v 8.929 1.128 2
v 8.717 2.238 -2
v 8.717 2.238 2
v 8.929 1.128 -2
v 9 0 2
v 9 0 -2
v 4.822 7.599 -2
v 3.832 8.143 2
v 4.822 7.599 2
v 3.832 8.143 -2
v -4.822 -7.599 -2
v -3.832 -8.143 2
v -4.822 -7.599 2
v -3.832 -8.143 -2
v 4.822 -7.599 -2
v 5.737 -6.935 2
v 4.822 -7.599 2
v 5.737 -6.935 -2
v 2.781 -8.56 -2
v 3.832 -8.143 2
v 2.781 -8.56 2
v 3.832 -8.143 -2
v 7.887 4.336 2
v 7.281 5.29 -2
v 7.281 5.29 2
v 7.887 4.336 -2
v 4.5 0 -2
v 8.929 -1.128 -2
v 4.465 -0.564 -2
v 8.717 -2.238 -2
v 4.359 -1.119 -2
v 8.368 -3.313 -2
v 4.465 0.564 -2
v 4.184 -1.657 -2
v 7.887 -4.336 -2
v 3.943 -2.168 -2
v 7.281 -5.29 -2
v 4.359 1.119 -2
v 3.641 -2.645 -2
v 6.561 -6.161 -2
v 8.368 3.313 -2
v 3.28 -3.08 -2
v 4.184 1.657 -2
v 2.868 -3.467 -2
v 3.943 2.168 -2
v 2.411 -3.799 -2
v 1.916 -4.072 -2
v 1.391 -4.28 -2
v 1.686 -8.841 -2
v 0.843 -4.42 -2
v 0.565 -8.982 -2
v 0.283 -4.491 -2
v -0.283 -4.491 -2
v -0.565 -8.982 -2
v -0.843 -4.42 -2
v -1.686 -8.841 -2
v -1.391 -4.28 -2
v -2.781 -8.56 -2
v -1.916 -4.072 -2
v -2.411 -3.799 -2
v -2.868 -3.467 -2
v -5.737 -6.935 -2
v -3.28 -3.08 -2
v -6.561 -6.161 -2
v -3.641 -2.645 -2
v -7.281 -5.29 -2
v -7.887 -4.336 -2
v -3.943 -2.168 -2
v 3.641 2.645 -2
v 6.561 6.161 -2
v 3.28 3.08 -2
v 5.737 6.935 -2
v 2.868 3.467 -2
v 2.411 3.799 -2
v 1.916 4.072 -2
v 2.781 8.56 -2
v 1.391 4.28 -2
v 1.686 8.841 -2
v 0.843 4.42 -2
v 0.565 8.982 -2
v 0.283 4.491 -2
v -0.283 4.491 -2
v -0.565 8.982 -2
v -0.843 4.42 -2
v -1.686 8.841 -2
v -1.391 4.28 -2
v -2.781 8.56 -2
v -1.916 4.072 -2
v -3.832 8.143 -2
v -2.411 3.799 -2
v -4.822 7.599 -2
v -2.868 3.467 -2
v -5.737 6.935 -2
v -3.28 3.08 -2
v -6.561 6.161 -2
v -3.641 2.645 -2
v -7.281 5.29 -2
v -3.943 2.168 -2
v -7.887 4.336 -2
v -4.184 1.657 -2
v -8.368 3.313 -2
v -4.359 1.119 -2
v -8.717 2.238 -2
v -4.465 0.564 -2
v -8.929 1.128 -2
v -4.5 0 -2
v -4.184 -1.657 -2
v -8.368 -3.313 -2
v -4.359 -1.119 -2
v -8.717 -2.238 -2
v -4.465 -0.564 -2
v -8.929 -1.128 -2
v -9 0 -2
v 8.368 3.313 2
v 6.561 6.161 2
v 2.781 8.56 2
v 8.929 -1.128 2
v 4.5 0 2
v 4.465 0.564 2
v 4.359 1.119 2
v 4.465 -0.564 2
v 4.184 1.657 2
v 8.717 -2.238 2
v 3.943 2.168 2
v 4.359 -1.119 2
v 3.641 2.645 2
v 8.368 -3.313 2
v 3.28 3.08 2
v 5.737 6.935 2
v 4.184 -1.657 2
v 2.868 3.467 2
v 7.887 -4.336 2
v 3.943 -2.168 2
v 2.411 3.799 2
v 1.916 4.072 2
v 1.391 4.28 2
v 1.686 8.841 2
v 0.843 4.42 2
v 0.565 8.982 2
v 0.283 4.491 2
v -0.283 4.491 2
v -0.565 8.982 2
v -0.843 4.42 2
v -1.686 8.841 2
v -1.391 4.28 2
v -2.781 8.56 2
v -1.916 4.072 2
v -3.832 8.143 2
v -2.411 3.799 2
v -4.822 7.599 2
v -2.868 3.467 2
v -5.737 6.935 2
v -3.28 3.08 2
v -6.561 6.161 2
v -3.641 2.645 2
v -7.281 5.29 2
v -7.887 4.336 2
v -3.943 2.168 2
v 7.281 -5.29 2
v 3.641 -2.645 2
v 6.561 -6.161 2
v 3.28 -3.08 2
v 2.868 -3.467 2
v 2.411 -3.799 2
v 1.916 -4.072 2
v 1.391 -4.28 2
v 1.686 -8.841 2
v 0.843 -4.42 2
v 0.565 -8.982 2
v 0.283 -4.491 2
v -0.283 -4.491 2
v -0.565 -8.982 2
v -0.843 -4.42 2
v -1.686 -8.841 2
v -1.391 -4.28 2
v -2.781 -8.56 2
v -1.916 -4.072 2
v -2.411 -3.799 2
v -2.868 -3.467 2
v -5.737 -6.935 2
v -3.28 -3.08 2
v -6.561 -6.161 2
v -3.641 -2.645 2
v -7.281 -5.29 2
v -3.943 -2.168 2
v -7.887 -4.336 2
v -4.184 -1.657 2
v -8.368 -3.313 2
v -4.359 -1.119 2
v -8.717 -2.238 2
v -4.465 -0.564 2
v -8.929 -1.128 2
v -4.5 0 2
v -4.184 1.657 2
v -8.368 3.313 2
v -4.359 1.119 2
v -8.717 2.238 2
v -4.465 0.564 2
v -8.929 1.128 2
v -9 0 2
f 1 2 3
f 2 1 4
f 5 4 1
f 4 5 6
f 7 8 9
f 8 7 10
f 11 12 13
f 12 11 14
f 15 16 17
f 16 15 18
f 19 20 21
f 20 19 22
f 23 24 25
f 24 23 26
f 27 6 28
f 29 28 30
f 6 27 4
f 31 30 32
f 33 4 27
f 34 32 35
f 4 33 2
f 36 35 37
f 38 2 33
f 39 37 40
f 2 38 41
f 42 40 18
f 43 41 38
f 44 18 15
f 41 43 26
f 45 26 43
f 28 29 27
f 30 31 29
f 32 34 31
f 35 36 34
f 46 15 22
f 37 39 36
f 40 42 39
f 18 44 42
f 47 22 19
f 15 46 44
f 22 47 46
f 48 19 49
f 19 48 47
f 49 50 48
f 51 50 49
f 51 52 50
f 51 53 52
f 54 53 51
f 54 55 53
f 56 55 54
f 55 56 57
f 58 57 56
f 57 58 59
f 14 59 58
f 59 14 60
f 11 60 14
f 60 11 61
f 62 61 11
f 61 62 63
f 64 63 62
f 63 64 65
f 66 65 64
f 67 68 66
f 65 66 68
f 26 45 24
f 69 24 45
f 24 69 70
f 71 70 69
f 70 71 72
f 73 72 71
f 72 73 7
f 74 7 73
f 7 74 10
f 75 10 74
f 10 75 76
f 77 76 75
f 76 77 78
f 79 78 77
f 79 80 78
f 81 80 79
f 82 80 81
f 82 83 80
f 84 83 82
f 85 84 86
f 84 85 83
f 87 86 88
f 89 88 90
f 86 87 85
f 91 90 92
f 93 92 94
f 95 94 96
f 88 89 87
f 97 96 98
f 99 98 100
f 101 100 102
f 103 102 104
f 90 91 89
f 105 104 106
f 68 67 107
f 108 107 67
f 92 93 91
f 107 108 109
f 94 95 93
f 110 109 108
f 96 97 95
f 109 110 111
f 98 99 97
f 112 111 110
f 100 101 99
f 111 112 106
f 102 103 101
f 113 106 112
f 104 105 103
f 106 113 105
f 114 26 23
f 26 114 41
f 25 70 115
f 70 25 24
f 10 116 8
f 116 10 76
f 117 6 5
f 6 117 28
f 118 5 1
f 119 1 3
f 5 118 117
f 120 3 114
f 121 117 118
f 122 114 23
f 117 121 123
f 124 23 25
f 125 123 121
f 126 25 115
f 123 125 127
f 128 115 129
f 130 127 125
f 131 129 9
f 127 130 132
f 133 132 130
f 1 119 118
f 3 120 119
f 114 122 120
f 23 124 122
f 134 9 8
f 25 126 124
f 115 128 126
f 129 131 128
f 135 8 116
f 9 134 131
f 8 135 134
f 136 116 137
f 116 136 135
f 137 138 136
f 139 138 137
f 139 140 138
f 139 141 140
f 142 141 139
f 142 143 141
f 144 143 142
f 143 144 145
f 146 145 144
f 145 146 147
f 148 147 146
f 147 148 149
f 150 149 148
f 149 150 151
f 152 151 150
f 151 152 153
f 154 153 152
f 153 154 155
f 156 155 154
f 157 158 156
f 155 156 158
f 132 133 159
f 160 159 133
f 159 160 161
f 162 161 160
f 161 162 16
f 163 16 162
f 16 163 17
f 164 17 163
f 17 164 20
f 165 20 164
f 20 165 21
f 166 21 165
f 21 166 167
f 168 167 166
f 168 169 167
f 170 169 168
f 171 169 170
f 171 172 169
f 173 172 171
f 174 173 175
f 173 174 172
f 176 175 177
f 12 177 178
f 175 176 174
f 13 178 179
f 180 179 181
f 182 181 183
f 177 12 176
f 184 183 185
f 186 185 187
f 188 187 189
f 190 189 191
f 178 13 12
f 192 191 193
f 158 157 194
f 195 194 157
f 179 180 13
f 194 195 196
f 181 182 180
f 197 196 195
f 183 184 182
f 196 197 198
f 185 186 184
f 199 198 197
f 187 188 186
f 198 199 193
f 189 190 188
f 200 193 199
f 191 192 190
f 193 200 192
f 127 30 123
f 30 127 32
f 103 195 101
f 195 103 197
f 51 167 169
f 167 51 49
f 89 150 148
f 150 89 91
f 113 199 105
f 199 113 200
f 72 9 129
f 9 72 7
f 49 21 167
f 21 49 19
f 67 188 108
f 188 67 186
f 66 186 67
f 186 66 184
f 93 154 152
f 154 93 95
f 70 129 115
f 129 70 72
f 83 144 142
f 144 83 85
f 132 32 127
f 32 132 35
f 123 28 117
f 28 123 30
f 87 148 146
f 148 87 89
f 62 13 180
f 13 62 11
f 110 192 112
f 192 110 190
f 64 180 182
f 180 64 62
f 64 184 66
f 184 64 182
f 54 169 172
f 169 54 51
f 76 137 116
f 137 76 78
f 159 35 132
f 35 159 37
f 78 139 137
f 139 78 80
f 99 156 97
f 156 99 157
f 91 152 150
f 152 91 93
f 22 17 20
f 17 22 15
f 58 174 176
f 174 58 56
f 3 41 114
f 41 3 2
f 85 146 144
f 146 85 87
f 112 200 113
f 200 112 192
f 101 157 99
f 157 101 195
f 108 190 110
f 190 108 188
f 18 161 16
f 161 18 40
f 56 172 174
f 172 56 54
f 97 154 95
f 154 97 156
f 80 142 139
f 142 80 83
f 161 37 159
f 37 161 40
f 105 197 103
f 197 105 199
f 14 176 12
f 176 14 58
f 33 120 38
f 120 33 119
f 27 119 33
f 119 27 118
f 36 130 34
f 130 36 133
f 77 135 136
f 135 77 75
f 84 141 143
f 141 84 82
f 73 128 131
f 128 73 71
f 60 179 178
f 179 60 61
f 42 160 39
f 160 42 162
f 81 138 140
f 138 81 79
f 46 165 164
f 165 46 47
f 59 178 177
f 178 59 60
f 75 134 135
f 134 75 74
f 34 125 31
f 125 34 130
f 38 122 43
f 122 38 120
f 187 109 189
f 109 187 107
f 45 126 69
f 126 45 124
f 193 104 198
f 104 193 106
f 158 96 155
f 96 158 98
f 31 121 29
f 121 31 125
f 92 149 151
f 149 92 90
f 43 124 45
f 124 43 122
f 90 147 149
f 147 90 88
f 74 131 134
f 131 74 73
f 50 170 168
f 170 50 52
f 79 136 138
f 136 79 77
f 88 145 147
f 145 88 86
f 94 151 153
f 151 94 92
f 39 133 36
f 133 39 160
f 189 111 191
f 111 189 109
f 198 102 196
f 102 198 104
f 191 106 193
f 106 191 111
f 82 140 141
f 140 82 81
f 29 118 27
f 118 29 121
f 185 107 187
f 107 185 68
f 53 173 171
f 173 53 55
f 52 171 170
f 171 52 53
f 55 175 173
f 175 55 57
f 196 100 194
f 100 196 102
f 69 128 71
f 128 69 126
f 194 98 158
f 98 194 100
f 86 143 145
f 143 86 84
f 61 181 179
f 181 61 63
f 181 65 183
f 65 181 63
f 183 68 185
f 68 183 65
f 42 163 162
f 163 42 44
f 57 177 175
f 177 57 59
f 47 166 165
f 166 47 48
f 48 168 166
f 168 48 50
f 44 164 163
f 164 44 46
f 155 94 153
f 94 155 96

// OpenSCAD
$fn = 50;


difference() {
	union() {
		translate(v = [0, 0, -2.0000000000]) {
			cylinder(h = 4, r = 9.0000000000);
		}
	}
	union() {
		translate(v = [0, 0, -100.0000000000]) {
			cylinder(h = 200, r = 4.5000000000);
		}
	}
}
